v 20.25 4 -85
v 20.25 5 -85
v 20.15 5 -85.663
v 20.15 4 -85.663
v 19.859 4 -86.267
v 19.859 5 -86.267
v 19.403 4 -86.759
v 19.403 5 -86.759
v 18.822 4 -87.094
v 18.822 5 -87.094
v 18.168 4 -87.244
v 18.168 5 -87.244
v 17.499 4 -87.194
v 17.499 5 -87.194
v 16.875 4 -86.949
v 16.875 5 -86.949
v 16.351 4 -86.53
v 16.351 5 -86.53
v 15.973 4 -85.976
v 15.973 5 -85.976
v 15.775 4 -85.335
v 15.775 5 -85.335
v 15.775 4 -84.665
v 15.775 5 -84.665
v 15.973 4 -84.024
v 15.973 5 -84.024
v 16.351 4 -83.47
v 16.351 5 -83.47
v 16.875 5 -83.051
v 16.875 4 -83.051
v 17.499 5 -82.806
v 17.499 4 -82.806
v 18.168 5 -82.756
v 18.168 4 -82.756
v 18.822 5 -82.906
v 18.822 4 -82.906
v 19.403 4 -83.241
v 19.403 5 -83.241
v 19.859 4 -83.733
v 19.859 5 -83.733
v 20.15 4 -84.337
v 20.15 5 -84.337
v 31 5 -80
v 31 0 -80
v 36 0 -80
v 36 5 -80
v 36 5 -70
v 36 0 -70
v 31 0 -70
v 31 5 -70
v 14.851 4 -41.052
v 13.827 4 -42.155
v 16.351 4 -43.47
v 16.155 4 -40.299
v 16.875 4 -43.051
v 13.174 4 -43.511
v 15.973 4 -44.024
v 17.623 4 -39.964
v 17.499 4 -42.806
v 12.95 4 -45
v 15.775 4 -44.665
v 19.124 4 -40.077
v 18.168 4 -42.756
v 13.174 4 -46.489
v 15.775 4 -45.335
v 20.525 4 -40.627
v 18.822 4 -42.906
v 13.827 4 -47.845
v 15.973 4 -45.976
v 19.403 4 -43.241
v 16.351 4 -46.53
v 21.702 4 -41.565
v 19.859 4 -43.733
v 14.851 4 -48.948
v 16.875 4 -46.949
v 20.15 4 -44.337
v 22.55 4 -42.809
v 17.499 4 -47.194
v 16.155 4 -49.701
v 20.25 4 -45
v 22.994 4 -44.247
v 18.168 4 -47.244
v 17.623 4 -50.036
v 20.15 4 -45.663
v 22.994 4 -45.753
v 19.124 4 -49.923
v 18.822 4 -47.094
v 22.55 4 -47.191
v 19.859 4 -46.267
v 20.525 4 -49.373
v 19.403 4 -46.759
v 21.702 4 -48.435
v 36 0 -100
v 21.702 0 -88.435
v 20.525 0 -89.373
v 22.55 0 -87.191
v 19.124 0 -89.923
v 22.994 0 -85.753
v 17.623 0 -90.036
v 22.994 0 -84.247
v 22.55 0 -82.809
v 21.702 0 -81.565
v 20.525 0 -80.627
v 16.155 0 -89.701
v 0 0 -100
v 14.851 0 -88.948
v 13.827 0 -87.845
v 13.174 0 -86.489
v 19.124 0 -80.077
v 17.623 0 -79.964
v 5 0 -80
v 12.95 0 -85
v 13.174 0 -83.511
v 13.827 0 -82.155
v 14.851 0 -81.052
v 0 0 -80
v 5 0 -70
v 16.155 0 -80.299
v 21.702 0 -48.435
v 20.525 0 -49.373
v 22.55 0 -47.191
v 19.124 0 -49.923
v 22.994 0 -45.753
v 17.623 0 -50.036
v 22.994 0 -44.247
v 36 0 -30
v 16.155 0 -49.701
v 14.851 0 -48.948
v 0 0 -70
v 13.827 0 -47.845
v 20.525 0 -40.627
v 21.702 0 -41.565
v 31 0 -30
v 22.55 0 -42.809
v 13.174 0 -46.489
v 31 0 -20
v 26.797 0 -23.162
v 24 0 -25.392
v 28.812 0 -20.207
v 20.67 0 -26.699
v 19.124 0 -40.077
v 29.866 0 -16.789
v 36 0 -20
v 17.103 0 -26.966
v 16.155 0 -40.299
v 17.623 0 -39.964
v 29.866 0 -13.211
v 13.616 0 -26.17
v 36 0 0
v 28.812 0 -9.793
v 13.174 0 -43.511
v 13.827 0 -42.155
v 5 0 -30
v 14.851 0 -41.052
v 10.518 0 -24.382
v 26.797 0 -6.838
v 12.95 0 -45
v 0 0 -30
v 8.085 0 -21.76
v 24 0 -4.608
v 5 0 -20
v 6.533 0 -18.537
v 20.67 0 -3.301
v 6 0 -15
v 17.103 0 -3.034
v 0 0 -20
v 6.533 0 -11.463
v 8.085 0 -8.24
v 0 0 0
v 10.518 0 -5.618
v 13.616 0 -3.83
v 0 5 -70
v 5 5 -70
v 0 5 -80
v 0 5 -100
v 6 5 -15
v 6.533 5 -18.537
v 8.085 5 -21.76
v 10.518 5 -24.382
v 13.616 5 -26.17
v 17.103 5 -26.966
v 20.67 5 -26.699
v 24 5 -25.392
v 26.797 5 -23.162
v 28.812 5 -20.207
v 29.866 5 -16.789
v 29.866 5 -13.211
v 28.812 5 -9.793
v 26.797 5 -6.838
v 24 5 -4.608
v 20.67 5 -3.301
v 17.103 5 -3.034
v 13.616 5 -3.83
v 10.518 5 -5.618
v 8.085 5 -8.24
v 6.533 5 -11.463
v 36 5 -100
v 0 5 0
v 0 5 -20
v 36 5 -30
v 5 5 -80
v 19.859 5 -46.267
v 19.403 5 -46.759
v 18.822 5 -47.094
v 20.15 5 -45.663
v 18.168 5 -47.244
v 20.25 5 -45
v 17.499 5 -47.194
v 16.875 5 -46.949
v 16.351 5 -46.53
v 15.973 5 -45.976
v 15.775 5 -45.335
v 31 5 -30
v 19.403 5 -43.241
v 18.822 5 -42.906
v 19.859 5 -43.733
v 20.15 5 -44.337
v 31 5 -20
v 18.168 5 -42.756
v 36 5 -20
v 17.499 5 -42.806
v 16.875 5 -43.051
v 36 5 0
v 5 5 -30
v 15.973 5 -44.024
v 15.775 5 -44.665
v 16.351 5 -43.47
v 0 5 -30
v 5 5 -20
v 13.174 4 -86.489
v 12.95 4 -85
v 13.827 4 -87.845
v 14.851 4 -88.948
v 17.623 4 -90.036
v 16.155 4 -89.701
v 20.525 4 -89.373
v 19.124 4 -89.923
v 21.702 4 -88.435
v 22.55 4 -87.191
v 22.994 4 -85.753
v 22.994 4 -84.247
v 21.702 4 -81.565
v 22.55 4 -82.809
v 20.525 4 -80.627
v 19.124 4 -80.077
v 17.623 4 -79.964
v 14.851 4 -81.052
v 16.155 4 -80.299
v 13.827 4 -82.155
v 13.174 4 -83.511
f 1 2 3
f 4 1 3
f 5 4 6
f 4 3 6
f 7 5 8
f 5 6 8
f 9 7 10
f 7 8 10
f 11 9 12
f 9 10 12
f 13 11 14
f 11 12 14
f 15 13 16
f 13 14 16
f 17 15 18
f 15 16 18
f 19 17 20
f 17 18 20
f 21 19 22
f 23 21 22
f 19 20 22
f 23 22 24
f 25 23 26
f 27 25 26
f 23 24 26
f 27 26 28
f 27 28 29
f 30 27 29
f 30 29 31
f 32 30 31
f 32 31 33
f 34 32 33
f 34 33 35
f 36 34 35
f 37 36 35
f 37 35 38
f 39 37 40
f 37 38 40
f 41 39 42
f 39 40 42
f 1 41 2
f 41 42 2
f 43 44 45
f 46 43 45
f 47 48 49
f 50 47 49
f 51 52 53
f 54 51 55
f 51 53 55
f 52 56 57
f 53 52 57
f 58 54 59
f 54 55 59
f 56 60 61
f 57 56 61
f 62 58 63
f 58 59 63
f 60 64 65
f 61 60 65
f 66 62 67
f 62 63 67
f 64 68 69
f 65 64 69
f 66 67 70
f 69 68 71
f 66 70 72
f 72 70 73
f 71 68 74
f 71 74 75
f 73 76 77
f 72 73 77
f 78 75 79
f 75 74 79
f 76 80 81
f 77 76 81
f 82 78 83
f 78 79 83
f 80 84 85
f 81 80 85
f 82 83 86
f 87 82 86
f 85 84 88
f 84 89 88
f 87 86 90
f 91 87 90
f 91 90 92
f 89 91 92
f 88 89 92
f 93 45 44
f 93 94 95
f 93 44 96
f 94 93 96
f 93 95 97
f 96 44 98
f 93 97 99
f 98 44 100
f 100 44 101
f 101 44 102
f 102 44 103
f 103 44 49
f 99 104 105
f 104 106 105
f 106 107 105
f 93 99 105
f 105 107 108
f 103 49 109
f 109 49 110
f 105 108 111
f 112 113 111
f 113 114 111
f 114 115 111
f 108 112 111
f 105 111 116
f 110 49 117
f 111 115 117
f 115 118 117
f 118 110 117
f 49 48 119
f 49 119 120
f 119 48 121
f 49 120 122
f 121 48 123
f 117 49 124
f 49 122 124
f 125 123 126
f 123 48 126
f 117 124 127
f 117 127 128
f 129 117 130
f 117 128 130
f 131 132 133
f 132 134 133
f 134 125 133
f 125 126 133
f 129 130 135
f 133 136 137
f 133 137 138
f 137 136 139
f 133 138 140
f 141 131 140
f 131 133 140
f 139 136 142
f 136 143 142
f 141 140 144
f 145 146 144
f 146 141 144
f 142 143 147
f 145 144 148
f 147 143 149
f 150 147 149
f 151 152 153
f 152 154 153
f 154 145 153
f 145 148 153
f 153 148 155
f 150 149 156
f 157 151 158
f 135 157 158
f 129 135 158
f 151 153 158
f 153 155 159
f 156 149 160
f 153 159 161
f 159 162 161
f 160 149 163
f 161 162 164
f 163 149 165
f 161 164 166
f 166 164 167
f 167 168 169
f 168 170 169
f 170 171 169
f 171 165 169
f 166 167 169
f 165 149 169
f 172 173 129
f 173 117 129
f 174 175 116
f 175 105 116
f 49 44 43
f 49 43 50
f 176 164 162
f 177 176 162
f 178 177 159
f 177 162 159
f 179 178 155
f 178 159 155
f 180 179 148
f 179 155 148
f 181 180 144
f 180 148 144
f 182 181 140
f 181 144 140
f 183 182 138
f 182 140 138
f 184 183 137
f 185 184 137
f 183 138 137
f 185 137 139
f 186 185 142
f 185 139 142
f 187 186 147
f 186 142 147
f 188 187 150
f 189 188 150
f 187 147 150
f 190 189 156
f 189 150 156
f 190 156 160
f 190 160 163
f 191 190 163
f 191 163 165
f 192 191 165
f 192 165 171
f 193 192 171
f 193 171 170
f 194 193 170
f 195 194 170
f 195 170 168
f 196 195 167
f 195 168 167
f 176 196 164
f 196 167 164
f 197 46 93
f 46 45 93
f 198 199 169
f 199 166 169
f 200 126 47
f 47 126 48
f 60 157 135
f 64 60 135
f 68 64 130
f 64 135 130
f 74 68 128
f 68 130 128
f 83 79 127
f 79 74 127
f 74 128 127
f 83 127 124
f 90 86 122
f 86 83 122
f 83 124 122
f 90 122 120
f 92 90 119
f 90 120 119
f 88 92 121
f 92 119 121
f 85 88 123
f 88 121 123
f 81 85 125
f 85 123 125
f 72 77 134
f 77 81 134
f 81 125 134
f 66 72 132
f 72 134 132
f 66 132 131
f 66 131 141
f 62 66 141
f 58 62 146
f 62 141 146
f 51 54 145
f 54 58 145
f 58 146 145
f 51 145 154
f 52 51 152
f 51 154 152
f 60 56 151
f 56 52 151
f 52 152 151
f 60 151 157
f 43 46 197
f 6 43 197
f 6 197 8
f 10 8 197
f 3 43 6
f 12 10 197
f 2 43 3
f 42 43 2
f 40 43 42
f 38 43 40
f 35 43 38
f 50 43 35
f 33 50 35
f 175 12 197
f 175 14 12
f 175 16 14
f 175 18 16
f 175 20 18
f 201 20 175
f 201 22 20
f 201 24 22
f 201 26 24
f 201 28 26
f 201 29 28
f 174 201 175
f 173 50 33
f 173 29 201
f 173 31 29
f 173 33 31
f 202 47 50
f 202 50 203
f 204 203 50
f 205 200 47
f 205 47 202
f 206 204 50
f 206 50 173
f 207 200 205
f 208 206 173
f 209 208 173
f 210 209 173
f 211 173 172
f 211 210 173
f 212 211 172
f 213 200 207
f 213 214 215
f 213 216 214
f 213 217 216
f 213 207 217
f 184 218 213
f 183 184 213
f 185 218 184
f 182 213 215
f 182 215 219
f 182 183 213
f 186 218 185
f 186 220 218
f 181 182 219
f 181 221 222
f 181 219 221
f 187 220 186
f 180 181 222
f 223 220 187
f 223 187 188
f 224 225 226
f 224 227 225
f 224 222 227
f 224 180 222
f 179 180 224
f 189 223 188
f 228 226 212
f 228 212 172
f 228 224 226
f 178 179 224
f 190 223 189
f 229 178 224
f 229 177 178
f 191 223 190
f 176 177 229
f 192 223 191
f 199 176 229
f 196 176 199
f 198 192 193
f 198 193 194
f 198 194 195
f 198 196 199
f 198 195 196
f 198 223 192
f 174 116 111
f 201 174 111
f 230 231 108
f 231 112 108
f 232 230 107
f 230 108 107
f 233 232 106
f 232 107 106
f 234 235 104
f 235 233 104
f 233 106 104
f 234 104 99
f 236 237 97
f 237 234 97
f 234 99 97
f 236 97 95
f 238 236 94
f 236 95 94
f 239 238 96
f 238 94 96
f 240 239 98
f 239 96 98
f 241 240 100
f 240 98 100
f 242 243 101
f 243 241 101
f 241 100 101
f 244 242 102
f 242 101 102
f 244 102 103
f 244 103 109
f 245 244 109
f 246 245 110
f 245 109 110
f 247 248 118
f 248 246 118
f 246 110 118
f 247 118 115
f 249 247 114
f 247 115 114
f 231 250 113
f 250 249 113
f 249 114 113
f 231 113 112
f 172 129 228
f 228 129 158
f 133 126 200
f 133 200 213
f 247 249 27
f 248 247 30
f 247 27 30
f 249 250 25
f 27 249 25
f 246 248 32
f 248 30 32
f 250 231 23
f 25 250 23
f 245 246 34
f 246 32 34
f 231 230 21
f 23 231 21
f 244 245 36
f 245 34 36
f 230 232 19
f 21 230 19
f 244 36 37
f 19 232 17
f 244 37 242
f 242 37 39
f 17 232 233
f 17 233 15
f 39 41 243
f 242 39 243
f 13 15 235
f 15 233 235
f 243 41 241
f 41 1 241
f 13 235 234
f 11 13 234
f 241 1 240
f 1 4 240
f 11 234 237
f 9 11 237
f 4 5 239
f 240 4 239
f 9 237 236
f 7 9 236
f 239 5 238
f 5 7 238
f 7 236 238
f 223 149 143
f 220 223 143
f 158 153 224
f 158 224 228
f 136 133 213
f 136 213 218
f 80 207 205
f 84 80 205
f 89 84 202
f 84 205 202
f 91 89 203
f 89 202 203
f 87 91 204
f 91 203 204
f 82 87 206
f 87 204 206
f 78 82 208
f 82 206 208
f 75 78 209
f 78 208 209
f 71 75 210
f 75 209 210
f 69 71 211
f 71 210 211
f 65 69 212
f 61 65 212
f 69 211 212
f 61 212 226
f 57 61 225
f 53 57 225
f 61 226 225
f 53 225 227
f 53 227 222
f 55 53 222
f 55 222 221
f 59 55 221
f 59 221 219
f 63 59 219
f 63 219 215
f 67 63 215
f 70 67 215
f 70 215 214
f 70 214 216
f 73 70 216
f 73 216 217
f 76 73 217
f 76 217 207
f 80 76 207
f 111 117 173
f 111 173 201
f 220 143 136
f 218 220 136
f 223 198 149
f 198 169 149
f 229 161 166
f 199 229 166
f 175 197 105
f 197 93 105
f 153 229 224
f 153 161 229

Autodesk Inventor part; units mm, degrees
ref_plane "YZ Plane" through (0, 0, 0) normal (1, 0, 0) x (0, 1, 0)
ref_plane "XZ Plane" through (0, 0, 0) normal (0, 1, 0) x (-1, 0, 0)
ref_plane "XY Plane" through (0, 0, 0) normal (0, 0, 1) x (1, 0, 0)
sketch "Sketch2" plane through (0, 0, 0) normal (0, 1, 0) x (-1, 0, 0)
  line L0 (0, 0) -> (-36, 0)
  line L1 (-36, 0) -> (-36, -100)
  line L2 (-36, -100) -> (0, -100)
  line L3 (0, -100) -> (0, 0)
  line L4 (-36, 0) -> (-36, -20)
  line L5 (-36, -20) -> (0, -20)
  line L6 (-36, -100) -> (-36, -80)
  line L7 (-36, -80) -> (-36, -61.7109)
  line L8 (0, -61.7109) -> (0, -80)
  line L9 (-36, -80) -> (-36, -70)
  line L10 (-36, -70) -> (0, -70)
  line L11 (0, -80) -> (-36, -80)
  line L12 (0, -70) -> (0, -80)
  line L13 (0, -70) -> (-5, -70)
  line L14 (-5, -70) -> (-5, -80)
  line L15 (-36, -20) -> (-36, -30)
  line L16 (-36, -30) -> (0, -30)
  line L17 (0, -20) -> (-5, -20)
  line L18 (-5, -20) -> (-5, -30)
  line L19 (-36, -80) -> (-31, -80)
  line L20 (-31, -80) -> (-31, -70)
  line L21 (-31, -30) -> (-31, -20)
  line L22 (-18, 0) -> (-18, -15)
  circle A0 centre (-18, -15) radius 12
  line L23 (-18, -15) -> (-18, -45.5)
  line L24 (-18, -45.5) -> (-18, -86)
  line L25 (-18, -15) -> (-18, -45)
  circle A1 centre (-18, -45) radius 5.05
  line L26 (-18, -45) -> (-18, -85)
  circle A2 centre (-18, -85) radius 5.05
  dimension "d0" = 36
  dimension "d1" = 100
  dimension "d2" = 20
  dimension "d3" = 20
  dimension "d4" = 10
  dimension "d5" = 5
  dimension "d6" = 10
  dimension "d7" = 5
  dimension "d8" = 5
  dimension "d9" = 15
  dimension "d10" = 24
  dimension "d17" = 30
  dimension "d18" = 10.1
  dimension "d19" = 40
  dimension "d20" = 10.1
extrude "Extrusion1" add sketch "Sketch2" along normal blind 5 contours L3 L5 A0 L22 L0 | L22 A0 L5 L1 L0 | L3 L10 L24 A1 L23 L16 | L18 L16 L23 A0 L5 | A0 L23 L16 L21 L5 | L16 L23 A1 L24 L10 L1 | L3 L2 L1 L11 A2 | L14 L11 A2 L24 L10 | L24 A2 L11 L20 L10
sketch "Sketch3" plane through (0, 5, 0) normal (0, 1, 0) x (1, 0, 0)
  circle A0 centre (18, 45) radius 5.05 projected
  circle A1 centre (18, 45) radius 5.05
  circle A2 centre (18, 45) radius 2.25
  circle A3 centre (18, 85) radius 5.05 projected
  circle A4 centre (18, 85) radius 5.05
  circle A5 centre (18, 85) radius 2.25
  point P0 (0, 0)
  dimension "d21" = 4.5
  dimension "d22" = 4.5
extrude "Extrusion2" add sketch "Sketch3" against normal blind 1
equation "\"BendRadius\" = Thickness"
equation "\"BendReliefWidth\" = Thickness"
equation "\"BendReliefDepth\" = 0.5 * Thickness"
equation "\"CornerReliefSize\" = 4 * Thickness"
equation "\"MinimumRemnant\" = 2 * Thickness"
equation "\"TransitionRadius\" = BendRadius"
equation "\"JacobiRadiusSize\" = BendRadius"
equation "\"GapSize\" = Thickness"
equation "\"Thickness\" = 0.5"
properties part number "Part2v2"
